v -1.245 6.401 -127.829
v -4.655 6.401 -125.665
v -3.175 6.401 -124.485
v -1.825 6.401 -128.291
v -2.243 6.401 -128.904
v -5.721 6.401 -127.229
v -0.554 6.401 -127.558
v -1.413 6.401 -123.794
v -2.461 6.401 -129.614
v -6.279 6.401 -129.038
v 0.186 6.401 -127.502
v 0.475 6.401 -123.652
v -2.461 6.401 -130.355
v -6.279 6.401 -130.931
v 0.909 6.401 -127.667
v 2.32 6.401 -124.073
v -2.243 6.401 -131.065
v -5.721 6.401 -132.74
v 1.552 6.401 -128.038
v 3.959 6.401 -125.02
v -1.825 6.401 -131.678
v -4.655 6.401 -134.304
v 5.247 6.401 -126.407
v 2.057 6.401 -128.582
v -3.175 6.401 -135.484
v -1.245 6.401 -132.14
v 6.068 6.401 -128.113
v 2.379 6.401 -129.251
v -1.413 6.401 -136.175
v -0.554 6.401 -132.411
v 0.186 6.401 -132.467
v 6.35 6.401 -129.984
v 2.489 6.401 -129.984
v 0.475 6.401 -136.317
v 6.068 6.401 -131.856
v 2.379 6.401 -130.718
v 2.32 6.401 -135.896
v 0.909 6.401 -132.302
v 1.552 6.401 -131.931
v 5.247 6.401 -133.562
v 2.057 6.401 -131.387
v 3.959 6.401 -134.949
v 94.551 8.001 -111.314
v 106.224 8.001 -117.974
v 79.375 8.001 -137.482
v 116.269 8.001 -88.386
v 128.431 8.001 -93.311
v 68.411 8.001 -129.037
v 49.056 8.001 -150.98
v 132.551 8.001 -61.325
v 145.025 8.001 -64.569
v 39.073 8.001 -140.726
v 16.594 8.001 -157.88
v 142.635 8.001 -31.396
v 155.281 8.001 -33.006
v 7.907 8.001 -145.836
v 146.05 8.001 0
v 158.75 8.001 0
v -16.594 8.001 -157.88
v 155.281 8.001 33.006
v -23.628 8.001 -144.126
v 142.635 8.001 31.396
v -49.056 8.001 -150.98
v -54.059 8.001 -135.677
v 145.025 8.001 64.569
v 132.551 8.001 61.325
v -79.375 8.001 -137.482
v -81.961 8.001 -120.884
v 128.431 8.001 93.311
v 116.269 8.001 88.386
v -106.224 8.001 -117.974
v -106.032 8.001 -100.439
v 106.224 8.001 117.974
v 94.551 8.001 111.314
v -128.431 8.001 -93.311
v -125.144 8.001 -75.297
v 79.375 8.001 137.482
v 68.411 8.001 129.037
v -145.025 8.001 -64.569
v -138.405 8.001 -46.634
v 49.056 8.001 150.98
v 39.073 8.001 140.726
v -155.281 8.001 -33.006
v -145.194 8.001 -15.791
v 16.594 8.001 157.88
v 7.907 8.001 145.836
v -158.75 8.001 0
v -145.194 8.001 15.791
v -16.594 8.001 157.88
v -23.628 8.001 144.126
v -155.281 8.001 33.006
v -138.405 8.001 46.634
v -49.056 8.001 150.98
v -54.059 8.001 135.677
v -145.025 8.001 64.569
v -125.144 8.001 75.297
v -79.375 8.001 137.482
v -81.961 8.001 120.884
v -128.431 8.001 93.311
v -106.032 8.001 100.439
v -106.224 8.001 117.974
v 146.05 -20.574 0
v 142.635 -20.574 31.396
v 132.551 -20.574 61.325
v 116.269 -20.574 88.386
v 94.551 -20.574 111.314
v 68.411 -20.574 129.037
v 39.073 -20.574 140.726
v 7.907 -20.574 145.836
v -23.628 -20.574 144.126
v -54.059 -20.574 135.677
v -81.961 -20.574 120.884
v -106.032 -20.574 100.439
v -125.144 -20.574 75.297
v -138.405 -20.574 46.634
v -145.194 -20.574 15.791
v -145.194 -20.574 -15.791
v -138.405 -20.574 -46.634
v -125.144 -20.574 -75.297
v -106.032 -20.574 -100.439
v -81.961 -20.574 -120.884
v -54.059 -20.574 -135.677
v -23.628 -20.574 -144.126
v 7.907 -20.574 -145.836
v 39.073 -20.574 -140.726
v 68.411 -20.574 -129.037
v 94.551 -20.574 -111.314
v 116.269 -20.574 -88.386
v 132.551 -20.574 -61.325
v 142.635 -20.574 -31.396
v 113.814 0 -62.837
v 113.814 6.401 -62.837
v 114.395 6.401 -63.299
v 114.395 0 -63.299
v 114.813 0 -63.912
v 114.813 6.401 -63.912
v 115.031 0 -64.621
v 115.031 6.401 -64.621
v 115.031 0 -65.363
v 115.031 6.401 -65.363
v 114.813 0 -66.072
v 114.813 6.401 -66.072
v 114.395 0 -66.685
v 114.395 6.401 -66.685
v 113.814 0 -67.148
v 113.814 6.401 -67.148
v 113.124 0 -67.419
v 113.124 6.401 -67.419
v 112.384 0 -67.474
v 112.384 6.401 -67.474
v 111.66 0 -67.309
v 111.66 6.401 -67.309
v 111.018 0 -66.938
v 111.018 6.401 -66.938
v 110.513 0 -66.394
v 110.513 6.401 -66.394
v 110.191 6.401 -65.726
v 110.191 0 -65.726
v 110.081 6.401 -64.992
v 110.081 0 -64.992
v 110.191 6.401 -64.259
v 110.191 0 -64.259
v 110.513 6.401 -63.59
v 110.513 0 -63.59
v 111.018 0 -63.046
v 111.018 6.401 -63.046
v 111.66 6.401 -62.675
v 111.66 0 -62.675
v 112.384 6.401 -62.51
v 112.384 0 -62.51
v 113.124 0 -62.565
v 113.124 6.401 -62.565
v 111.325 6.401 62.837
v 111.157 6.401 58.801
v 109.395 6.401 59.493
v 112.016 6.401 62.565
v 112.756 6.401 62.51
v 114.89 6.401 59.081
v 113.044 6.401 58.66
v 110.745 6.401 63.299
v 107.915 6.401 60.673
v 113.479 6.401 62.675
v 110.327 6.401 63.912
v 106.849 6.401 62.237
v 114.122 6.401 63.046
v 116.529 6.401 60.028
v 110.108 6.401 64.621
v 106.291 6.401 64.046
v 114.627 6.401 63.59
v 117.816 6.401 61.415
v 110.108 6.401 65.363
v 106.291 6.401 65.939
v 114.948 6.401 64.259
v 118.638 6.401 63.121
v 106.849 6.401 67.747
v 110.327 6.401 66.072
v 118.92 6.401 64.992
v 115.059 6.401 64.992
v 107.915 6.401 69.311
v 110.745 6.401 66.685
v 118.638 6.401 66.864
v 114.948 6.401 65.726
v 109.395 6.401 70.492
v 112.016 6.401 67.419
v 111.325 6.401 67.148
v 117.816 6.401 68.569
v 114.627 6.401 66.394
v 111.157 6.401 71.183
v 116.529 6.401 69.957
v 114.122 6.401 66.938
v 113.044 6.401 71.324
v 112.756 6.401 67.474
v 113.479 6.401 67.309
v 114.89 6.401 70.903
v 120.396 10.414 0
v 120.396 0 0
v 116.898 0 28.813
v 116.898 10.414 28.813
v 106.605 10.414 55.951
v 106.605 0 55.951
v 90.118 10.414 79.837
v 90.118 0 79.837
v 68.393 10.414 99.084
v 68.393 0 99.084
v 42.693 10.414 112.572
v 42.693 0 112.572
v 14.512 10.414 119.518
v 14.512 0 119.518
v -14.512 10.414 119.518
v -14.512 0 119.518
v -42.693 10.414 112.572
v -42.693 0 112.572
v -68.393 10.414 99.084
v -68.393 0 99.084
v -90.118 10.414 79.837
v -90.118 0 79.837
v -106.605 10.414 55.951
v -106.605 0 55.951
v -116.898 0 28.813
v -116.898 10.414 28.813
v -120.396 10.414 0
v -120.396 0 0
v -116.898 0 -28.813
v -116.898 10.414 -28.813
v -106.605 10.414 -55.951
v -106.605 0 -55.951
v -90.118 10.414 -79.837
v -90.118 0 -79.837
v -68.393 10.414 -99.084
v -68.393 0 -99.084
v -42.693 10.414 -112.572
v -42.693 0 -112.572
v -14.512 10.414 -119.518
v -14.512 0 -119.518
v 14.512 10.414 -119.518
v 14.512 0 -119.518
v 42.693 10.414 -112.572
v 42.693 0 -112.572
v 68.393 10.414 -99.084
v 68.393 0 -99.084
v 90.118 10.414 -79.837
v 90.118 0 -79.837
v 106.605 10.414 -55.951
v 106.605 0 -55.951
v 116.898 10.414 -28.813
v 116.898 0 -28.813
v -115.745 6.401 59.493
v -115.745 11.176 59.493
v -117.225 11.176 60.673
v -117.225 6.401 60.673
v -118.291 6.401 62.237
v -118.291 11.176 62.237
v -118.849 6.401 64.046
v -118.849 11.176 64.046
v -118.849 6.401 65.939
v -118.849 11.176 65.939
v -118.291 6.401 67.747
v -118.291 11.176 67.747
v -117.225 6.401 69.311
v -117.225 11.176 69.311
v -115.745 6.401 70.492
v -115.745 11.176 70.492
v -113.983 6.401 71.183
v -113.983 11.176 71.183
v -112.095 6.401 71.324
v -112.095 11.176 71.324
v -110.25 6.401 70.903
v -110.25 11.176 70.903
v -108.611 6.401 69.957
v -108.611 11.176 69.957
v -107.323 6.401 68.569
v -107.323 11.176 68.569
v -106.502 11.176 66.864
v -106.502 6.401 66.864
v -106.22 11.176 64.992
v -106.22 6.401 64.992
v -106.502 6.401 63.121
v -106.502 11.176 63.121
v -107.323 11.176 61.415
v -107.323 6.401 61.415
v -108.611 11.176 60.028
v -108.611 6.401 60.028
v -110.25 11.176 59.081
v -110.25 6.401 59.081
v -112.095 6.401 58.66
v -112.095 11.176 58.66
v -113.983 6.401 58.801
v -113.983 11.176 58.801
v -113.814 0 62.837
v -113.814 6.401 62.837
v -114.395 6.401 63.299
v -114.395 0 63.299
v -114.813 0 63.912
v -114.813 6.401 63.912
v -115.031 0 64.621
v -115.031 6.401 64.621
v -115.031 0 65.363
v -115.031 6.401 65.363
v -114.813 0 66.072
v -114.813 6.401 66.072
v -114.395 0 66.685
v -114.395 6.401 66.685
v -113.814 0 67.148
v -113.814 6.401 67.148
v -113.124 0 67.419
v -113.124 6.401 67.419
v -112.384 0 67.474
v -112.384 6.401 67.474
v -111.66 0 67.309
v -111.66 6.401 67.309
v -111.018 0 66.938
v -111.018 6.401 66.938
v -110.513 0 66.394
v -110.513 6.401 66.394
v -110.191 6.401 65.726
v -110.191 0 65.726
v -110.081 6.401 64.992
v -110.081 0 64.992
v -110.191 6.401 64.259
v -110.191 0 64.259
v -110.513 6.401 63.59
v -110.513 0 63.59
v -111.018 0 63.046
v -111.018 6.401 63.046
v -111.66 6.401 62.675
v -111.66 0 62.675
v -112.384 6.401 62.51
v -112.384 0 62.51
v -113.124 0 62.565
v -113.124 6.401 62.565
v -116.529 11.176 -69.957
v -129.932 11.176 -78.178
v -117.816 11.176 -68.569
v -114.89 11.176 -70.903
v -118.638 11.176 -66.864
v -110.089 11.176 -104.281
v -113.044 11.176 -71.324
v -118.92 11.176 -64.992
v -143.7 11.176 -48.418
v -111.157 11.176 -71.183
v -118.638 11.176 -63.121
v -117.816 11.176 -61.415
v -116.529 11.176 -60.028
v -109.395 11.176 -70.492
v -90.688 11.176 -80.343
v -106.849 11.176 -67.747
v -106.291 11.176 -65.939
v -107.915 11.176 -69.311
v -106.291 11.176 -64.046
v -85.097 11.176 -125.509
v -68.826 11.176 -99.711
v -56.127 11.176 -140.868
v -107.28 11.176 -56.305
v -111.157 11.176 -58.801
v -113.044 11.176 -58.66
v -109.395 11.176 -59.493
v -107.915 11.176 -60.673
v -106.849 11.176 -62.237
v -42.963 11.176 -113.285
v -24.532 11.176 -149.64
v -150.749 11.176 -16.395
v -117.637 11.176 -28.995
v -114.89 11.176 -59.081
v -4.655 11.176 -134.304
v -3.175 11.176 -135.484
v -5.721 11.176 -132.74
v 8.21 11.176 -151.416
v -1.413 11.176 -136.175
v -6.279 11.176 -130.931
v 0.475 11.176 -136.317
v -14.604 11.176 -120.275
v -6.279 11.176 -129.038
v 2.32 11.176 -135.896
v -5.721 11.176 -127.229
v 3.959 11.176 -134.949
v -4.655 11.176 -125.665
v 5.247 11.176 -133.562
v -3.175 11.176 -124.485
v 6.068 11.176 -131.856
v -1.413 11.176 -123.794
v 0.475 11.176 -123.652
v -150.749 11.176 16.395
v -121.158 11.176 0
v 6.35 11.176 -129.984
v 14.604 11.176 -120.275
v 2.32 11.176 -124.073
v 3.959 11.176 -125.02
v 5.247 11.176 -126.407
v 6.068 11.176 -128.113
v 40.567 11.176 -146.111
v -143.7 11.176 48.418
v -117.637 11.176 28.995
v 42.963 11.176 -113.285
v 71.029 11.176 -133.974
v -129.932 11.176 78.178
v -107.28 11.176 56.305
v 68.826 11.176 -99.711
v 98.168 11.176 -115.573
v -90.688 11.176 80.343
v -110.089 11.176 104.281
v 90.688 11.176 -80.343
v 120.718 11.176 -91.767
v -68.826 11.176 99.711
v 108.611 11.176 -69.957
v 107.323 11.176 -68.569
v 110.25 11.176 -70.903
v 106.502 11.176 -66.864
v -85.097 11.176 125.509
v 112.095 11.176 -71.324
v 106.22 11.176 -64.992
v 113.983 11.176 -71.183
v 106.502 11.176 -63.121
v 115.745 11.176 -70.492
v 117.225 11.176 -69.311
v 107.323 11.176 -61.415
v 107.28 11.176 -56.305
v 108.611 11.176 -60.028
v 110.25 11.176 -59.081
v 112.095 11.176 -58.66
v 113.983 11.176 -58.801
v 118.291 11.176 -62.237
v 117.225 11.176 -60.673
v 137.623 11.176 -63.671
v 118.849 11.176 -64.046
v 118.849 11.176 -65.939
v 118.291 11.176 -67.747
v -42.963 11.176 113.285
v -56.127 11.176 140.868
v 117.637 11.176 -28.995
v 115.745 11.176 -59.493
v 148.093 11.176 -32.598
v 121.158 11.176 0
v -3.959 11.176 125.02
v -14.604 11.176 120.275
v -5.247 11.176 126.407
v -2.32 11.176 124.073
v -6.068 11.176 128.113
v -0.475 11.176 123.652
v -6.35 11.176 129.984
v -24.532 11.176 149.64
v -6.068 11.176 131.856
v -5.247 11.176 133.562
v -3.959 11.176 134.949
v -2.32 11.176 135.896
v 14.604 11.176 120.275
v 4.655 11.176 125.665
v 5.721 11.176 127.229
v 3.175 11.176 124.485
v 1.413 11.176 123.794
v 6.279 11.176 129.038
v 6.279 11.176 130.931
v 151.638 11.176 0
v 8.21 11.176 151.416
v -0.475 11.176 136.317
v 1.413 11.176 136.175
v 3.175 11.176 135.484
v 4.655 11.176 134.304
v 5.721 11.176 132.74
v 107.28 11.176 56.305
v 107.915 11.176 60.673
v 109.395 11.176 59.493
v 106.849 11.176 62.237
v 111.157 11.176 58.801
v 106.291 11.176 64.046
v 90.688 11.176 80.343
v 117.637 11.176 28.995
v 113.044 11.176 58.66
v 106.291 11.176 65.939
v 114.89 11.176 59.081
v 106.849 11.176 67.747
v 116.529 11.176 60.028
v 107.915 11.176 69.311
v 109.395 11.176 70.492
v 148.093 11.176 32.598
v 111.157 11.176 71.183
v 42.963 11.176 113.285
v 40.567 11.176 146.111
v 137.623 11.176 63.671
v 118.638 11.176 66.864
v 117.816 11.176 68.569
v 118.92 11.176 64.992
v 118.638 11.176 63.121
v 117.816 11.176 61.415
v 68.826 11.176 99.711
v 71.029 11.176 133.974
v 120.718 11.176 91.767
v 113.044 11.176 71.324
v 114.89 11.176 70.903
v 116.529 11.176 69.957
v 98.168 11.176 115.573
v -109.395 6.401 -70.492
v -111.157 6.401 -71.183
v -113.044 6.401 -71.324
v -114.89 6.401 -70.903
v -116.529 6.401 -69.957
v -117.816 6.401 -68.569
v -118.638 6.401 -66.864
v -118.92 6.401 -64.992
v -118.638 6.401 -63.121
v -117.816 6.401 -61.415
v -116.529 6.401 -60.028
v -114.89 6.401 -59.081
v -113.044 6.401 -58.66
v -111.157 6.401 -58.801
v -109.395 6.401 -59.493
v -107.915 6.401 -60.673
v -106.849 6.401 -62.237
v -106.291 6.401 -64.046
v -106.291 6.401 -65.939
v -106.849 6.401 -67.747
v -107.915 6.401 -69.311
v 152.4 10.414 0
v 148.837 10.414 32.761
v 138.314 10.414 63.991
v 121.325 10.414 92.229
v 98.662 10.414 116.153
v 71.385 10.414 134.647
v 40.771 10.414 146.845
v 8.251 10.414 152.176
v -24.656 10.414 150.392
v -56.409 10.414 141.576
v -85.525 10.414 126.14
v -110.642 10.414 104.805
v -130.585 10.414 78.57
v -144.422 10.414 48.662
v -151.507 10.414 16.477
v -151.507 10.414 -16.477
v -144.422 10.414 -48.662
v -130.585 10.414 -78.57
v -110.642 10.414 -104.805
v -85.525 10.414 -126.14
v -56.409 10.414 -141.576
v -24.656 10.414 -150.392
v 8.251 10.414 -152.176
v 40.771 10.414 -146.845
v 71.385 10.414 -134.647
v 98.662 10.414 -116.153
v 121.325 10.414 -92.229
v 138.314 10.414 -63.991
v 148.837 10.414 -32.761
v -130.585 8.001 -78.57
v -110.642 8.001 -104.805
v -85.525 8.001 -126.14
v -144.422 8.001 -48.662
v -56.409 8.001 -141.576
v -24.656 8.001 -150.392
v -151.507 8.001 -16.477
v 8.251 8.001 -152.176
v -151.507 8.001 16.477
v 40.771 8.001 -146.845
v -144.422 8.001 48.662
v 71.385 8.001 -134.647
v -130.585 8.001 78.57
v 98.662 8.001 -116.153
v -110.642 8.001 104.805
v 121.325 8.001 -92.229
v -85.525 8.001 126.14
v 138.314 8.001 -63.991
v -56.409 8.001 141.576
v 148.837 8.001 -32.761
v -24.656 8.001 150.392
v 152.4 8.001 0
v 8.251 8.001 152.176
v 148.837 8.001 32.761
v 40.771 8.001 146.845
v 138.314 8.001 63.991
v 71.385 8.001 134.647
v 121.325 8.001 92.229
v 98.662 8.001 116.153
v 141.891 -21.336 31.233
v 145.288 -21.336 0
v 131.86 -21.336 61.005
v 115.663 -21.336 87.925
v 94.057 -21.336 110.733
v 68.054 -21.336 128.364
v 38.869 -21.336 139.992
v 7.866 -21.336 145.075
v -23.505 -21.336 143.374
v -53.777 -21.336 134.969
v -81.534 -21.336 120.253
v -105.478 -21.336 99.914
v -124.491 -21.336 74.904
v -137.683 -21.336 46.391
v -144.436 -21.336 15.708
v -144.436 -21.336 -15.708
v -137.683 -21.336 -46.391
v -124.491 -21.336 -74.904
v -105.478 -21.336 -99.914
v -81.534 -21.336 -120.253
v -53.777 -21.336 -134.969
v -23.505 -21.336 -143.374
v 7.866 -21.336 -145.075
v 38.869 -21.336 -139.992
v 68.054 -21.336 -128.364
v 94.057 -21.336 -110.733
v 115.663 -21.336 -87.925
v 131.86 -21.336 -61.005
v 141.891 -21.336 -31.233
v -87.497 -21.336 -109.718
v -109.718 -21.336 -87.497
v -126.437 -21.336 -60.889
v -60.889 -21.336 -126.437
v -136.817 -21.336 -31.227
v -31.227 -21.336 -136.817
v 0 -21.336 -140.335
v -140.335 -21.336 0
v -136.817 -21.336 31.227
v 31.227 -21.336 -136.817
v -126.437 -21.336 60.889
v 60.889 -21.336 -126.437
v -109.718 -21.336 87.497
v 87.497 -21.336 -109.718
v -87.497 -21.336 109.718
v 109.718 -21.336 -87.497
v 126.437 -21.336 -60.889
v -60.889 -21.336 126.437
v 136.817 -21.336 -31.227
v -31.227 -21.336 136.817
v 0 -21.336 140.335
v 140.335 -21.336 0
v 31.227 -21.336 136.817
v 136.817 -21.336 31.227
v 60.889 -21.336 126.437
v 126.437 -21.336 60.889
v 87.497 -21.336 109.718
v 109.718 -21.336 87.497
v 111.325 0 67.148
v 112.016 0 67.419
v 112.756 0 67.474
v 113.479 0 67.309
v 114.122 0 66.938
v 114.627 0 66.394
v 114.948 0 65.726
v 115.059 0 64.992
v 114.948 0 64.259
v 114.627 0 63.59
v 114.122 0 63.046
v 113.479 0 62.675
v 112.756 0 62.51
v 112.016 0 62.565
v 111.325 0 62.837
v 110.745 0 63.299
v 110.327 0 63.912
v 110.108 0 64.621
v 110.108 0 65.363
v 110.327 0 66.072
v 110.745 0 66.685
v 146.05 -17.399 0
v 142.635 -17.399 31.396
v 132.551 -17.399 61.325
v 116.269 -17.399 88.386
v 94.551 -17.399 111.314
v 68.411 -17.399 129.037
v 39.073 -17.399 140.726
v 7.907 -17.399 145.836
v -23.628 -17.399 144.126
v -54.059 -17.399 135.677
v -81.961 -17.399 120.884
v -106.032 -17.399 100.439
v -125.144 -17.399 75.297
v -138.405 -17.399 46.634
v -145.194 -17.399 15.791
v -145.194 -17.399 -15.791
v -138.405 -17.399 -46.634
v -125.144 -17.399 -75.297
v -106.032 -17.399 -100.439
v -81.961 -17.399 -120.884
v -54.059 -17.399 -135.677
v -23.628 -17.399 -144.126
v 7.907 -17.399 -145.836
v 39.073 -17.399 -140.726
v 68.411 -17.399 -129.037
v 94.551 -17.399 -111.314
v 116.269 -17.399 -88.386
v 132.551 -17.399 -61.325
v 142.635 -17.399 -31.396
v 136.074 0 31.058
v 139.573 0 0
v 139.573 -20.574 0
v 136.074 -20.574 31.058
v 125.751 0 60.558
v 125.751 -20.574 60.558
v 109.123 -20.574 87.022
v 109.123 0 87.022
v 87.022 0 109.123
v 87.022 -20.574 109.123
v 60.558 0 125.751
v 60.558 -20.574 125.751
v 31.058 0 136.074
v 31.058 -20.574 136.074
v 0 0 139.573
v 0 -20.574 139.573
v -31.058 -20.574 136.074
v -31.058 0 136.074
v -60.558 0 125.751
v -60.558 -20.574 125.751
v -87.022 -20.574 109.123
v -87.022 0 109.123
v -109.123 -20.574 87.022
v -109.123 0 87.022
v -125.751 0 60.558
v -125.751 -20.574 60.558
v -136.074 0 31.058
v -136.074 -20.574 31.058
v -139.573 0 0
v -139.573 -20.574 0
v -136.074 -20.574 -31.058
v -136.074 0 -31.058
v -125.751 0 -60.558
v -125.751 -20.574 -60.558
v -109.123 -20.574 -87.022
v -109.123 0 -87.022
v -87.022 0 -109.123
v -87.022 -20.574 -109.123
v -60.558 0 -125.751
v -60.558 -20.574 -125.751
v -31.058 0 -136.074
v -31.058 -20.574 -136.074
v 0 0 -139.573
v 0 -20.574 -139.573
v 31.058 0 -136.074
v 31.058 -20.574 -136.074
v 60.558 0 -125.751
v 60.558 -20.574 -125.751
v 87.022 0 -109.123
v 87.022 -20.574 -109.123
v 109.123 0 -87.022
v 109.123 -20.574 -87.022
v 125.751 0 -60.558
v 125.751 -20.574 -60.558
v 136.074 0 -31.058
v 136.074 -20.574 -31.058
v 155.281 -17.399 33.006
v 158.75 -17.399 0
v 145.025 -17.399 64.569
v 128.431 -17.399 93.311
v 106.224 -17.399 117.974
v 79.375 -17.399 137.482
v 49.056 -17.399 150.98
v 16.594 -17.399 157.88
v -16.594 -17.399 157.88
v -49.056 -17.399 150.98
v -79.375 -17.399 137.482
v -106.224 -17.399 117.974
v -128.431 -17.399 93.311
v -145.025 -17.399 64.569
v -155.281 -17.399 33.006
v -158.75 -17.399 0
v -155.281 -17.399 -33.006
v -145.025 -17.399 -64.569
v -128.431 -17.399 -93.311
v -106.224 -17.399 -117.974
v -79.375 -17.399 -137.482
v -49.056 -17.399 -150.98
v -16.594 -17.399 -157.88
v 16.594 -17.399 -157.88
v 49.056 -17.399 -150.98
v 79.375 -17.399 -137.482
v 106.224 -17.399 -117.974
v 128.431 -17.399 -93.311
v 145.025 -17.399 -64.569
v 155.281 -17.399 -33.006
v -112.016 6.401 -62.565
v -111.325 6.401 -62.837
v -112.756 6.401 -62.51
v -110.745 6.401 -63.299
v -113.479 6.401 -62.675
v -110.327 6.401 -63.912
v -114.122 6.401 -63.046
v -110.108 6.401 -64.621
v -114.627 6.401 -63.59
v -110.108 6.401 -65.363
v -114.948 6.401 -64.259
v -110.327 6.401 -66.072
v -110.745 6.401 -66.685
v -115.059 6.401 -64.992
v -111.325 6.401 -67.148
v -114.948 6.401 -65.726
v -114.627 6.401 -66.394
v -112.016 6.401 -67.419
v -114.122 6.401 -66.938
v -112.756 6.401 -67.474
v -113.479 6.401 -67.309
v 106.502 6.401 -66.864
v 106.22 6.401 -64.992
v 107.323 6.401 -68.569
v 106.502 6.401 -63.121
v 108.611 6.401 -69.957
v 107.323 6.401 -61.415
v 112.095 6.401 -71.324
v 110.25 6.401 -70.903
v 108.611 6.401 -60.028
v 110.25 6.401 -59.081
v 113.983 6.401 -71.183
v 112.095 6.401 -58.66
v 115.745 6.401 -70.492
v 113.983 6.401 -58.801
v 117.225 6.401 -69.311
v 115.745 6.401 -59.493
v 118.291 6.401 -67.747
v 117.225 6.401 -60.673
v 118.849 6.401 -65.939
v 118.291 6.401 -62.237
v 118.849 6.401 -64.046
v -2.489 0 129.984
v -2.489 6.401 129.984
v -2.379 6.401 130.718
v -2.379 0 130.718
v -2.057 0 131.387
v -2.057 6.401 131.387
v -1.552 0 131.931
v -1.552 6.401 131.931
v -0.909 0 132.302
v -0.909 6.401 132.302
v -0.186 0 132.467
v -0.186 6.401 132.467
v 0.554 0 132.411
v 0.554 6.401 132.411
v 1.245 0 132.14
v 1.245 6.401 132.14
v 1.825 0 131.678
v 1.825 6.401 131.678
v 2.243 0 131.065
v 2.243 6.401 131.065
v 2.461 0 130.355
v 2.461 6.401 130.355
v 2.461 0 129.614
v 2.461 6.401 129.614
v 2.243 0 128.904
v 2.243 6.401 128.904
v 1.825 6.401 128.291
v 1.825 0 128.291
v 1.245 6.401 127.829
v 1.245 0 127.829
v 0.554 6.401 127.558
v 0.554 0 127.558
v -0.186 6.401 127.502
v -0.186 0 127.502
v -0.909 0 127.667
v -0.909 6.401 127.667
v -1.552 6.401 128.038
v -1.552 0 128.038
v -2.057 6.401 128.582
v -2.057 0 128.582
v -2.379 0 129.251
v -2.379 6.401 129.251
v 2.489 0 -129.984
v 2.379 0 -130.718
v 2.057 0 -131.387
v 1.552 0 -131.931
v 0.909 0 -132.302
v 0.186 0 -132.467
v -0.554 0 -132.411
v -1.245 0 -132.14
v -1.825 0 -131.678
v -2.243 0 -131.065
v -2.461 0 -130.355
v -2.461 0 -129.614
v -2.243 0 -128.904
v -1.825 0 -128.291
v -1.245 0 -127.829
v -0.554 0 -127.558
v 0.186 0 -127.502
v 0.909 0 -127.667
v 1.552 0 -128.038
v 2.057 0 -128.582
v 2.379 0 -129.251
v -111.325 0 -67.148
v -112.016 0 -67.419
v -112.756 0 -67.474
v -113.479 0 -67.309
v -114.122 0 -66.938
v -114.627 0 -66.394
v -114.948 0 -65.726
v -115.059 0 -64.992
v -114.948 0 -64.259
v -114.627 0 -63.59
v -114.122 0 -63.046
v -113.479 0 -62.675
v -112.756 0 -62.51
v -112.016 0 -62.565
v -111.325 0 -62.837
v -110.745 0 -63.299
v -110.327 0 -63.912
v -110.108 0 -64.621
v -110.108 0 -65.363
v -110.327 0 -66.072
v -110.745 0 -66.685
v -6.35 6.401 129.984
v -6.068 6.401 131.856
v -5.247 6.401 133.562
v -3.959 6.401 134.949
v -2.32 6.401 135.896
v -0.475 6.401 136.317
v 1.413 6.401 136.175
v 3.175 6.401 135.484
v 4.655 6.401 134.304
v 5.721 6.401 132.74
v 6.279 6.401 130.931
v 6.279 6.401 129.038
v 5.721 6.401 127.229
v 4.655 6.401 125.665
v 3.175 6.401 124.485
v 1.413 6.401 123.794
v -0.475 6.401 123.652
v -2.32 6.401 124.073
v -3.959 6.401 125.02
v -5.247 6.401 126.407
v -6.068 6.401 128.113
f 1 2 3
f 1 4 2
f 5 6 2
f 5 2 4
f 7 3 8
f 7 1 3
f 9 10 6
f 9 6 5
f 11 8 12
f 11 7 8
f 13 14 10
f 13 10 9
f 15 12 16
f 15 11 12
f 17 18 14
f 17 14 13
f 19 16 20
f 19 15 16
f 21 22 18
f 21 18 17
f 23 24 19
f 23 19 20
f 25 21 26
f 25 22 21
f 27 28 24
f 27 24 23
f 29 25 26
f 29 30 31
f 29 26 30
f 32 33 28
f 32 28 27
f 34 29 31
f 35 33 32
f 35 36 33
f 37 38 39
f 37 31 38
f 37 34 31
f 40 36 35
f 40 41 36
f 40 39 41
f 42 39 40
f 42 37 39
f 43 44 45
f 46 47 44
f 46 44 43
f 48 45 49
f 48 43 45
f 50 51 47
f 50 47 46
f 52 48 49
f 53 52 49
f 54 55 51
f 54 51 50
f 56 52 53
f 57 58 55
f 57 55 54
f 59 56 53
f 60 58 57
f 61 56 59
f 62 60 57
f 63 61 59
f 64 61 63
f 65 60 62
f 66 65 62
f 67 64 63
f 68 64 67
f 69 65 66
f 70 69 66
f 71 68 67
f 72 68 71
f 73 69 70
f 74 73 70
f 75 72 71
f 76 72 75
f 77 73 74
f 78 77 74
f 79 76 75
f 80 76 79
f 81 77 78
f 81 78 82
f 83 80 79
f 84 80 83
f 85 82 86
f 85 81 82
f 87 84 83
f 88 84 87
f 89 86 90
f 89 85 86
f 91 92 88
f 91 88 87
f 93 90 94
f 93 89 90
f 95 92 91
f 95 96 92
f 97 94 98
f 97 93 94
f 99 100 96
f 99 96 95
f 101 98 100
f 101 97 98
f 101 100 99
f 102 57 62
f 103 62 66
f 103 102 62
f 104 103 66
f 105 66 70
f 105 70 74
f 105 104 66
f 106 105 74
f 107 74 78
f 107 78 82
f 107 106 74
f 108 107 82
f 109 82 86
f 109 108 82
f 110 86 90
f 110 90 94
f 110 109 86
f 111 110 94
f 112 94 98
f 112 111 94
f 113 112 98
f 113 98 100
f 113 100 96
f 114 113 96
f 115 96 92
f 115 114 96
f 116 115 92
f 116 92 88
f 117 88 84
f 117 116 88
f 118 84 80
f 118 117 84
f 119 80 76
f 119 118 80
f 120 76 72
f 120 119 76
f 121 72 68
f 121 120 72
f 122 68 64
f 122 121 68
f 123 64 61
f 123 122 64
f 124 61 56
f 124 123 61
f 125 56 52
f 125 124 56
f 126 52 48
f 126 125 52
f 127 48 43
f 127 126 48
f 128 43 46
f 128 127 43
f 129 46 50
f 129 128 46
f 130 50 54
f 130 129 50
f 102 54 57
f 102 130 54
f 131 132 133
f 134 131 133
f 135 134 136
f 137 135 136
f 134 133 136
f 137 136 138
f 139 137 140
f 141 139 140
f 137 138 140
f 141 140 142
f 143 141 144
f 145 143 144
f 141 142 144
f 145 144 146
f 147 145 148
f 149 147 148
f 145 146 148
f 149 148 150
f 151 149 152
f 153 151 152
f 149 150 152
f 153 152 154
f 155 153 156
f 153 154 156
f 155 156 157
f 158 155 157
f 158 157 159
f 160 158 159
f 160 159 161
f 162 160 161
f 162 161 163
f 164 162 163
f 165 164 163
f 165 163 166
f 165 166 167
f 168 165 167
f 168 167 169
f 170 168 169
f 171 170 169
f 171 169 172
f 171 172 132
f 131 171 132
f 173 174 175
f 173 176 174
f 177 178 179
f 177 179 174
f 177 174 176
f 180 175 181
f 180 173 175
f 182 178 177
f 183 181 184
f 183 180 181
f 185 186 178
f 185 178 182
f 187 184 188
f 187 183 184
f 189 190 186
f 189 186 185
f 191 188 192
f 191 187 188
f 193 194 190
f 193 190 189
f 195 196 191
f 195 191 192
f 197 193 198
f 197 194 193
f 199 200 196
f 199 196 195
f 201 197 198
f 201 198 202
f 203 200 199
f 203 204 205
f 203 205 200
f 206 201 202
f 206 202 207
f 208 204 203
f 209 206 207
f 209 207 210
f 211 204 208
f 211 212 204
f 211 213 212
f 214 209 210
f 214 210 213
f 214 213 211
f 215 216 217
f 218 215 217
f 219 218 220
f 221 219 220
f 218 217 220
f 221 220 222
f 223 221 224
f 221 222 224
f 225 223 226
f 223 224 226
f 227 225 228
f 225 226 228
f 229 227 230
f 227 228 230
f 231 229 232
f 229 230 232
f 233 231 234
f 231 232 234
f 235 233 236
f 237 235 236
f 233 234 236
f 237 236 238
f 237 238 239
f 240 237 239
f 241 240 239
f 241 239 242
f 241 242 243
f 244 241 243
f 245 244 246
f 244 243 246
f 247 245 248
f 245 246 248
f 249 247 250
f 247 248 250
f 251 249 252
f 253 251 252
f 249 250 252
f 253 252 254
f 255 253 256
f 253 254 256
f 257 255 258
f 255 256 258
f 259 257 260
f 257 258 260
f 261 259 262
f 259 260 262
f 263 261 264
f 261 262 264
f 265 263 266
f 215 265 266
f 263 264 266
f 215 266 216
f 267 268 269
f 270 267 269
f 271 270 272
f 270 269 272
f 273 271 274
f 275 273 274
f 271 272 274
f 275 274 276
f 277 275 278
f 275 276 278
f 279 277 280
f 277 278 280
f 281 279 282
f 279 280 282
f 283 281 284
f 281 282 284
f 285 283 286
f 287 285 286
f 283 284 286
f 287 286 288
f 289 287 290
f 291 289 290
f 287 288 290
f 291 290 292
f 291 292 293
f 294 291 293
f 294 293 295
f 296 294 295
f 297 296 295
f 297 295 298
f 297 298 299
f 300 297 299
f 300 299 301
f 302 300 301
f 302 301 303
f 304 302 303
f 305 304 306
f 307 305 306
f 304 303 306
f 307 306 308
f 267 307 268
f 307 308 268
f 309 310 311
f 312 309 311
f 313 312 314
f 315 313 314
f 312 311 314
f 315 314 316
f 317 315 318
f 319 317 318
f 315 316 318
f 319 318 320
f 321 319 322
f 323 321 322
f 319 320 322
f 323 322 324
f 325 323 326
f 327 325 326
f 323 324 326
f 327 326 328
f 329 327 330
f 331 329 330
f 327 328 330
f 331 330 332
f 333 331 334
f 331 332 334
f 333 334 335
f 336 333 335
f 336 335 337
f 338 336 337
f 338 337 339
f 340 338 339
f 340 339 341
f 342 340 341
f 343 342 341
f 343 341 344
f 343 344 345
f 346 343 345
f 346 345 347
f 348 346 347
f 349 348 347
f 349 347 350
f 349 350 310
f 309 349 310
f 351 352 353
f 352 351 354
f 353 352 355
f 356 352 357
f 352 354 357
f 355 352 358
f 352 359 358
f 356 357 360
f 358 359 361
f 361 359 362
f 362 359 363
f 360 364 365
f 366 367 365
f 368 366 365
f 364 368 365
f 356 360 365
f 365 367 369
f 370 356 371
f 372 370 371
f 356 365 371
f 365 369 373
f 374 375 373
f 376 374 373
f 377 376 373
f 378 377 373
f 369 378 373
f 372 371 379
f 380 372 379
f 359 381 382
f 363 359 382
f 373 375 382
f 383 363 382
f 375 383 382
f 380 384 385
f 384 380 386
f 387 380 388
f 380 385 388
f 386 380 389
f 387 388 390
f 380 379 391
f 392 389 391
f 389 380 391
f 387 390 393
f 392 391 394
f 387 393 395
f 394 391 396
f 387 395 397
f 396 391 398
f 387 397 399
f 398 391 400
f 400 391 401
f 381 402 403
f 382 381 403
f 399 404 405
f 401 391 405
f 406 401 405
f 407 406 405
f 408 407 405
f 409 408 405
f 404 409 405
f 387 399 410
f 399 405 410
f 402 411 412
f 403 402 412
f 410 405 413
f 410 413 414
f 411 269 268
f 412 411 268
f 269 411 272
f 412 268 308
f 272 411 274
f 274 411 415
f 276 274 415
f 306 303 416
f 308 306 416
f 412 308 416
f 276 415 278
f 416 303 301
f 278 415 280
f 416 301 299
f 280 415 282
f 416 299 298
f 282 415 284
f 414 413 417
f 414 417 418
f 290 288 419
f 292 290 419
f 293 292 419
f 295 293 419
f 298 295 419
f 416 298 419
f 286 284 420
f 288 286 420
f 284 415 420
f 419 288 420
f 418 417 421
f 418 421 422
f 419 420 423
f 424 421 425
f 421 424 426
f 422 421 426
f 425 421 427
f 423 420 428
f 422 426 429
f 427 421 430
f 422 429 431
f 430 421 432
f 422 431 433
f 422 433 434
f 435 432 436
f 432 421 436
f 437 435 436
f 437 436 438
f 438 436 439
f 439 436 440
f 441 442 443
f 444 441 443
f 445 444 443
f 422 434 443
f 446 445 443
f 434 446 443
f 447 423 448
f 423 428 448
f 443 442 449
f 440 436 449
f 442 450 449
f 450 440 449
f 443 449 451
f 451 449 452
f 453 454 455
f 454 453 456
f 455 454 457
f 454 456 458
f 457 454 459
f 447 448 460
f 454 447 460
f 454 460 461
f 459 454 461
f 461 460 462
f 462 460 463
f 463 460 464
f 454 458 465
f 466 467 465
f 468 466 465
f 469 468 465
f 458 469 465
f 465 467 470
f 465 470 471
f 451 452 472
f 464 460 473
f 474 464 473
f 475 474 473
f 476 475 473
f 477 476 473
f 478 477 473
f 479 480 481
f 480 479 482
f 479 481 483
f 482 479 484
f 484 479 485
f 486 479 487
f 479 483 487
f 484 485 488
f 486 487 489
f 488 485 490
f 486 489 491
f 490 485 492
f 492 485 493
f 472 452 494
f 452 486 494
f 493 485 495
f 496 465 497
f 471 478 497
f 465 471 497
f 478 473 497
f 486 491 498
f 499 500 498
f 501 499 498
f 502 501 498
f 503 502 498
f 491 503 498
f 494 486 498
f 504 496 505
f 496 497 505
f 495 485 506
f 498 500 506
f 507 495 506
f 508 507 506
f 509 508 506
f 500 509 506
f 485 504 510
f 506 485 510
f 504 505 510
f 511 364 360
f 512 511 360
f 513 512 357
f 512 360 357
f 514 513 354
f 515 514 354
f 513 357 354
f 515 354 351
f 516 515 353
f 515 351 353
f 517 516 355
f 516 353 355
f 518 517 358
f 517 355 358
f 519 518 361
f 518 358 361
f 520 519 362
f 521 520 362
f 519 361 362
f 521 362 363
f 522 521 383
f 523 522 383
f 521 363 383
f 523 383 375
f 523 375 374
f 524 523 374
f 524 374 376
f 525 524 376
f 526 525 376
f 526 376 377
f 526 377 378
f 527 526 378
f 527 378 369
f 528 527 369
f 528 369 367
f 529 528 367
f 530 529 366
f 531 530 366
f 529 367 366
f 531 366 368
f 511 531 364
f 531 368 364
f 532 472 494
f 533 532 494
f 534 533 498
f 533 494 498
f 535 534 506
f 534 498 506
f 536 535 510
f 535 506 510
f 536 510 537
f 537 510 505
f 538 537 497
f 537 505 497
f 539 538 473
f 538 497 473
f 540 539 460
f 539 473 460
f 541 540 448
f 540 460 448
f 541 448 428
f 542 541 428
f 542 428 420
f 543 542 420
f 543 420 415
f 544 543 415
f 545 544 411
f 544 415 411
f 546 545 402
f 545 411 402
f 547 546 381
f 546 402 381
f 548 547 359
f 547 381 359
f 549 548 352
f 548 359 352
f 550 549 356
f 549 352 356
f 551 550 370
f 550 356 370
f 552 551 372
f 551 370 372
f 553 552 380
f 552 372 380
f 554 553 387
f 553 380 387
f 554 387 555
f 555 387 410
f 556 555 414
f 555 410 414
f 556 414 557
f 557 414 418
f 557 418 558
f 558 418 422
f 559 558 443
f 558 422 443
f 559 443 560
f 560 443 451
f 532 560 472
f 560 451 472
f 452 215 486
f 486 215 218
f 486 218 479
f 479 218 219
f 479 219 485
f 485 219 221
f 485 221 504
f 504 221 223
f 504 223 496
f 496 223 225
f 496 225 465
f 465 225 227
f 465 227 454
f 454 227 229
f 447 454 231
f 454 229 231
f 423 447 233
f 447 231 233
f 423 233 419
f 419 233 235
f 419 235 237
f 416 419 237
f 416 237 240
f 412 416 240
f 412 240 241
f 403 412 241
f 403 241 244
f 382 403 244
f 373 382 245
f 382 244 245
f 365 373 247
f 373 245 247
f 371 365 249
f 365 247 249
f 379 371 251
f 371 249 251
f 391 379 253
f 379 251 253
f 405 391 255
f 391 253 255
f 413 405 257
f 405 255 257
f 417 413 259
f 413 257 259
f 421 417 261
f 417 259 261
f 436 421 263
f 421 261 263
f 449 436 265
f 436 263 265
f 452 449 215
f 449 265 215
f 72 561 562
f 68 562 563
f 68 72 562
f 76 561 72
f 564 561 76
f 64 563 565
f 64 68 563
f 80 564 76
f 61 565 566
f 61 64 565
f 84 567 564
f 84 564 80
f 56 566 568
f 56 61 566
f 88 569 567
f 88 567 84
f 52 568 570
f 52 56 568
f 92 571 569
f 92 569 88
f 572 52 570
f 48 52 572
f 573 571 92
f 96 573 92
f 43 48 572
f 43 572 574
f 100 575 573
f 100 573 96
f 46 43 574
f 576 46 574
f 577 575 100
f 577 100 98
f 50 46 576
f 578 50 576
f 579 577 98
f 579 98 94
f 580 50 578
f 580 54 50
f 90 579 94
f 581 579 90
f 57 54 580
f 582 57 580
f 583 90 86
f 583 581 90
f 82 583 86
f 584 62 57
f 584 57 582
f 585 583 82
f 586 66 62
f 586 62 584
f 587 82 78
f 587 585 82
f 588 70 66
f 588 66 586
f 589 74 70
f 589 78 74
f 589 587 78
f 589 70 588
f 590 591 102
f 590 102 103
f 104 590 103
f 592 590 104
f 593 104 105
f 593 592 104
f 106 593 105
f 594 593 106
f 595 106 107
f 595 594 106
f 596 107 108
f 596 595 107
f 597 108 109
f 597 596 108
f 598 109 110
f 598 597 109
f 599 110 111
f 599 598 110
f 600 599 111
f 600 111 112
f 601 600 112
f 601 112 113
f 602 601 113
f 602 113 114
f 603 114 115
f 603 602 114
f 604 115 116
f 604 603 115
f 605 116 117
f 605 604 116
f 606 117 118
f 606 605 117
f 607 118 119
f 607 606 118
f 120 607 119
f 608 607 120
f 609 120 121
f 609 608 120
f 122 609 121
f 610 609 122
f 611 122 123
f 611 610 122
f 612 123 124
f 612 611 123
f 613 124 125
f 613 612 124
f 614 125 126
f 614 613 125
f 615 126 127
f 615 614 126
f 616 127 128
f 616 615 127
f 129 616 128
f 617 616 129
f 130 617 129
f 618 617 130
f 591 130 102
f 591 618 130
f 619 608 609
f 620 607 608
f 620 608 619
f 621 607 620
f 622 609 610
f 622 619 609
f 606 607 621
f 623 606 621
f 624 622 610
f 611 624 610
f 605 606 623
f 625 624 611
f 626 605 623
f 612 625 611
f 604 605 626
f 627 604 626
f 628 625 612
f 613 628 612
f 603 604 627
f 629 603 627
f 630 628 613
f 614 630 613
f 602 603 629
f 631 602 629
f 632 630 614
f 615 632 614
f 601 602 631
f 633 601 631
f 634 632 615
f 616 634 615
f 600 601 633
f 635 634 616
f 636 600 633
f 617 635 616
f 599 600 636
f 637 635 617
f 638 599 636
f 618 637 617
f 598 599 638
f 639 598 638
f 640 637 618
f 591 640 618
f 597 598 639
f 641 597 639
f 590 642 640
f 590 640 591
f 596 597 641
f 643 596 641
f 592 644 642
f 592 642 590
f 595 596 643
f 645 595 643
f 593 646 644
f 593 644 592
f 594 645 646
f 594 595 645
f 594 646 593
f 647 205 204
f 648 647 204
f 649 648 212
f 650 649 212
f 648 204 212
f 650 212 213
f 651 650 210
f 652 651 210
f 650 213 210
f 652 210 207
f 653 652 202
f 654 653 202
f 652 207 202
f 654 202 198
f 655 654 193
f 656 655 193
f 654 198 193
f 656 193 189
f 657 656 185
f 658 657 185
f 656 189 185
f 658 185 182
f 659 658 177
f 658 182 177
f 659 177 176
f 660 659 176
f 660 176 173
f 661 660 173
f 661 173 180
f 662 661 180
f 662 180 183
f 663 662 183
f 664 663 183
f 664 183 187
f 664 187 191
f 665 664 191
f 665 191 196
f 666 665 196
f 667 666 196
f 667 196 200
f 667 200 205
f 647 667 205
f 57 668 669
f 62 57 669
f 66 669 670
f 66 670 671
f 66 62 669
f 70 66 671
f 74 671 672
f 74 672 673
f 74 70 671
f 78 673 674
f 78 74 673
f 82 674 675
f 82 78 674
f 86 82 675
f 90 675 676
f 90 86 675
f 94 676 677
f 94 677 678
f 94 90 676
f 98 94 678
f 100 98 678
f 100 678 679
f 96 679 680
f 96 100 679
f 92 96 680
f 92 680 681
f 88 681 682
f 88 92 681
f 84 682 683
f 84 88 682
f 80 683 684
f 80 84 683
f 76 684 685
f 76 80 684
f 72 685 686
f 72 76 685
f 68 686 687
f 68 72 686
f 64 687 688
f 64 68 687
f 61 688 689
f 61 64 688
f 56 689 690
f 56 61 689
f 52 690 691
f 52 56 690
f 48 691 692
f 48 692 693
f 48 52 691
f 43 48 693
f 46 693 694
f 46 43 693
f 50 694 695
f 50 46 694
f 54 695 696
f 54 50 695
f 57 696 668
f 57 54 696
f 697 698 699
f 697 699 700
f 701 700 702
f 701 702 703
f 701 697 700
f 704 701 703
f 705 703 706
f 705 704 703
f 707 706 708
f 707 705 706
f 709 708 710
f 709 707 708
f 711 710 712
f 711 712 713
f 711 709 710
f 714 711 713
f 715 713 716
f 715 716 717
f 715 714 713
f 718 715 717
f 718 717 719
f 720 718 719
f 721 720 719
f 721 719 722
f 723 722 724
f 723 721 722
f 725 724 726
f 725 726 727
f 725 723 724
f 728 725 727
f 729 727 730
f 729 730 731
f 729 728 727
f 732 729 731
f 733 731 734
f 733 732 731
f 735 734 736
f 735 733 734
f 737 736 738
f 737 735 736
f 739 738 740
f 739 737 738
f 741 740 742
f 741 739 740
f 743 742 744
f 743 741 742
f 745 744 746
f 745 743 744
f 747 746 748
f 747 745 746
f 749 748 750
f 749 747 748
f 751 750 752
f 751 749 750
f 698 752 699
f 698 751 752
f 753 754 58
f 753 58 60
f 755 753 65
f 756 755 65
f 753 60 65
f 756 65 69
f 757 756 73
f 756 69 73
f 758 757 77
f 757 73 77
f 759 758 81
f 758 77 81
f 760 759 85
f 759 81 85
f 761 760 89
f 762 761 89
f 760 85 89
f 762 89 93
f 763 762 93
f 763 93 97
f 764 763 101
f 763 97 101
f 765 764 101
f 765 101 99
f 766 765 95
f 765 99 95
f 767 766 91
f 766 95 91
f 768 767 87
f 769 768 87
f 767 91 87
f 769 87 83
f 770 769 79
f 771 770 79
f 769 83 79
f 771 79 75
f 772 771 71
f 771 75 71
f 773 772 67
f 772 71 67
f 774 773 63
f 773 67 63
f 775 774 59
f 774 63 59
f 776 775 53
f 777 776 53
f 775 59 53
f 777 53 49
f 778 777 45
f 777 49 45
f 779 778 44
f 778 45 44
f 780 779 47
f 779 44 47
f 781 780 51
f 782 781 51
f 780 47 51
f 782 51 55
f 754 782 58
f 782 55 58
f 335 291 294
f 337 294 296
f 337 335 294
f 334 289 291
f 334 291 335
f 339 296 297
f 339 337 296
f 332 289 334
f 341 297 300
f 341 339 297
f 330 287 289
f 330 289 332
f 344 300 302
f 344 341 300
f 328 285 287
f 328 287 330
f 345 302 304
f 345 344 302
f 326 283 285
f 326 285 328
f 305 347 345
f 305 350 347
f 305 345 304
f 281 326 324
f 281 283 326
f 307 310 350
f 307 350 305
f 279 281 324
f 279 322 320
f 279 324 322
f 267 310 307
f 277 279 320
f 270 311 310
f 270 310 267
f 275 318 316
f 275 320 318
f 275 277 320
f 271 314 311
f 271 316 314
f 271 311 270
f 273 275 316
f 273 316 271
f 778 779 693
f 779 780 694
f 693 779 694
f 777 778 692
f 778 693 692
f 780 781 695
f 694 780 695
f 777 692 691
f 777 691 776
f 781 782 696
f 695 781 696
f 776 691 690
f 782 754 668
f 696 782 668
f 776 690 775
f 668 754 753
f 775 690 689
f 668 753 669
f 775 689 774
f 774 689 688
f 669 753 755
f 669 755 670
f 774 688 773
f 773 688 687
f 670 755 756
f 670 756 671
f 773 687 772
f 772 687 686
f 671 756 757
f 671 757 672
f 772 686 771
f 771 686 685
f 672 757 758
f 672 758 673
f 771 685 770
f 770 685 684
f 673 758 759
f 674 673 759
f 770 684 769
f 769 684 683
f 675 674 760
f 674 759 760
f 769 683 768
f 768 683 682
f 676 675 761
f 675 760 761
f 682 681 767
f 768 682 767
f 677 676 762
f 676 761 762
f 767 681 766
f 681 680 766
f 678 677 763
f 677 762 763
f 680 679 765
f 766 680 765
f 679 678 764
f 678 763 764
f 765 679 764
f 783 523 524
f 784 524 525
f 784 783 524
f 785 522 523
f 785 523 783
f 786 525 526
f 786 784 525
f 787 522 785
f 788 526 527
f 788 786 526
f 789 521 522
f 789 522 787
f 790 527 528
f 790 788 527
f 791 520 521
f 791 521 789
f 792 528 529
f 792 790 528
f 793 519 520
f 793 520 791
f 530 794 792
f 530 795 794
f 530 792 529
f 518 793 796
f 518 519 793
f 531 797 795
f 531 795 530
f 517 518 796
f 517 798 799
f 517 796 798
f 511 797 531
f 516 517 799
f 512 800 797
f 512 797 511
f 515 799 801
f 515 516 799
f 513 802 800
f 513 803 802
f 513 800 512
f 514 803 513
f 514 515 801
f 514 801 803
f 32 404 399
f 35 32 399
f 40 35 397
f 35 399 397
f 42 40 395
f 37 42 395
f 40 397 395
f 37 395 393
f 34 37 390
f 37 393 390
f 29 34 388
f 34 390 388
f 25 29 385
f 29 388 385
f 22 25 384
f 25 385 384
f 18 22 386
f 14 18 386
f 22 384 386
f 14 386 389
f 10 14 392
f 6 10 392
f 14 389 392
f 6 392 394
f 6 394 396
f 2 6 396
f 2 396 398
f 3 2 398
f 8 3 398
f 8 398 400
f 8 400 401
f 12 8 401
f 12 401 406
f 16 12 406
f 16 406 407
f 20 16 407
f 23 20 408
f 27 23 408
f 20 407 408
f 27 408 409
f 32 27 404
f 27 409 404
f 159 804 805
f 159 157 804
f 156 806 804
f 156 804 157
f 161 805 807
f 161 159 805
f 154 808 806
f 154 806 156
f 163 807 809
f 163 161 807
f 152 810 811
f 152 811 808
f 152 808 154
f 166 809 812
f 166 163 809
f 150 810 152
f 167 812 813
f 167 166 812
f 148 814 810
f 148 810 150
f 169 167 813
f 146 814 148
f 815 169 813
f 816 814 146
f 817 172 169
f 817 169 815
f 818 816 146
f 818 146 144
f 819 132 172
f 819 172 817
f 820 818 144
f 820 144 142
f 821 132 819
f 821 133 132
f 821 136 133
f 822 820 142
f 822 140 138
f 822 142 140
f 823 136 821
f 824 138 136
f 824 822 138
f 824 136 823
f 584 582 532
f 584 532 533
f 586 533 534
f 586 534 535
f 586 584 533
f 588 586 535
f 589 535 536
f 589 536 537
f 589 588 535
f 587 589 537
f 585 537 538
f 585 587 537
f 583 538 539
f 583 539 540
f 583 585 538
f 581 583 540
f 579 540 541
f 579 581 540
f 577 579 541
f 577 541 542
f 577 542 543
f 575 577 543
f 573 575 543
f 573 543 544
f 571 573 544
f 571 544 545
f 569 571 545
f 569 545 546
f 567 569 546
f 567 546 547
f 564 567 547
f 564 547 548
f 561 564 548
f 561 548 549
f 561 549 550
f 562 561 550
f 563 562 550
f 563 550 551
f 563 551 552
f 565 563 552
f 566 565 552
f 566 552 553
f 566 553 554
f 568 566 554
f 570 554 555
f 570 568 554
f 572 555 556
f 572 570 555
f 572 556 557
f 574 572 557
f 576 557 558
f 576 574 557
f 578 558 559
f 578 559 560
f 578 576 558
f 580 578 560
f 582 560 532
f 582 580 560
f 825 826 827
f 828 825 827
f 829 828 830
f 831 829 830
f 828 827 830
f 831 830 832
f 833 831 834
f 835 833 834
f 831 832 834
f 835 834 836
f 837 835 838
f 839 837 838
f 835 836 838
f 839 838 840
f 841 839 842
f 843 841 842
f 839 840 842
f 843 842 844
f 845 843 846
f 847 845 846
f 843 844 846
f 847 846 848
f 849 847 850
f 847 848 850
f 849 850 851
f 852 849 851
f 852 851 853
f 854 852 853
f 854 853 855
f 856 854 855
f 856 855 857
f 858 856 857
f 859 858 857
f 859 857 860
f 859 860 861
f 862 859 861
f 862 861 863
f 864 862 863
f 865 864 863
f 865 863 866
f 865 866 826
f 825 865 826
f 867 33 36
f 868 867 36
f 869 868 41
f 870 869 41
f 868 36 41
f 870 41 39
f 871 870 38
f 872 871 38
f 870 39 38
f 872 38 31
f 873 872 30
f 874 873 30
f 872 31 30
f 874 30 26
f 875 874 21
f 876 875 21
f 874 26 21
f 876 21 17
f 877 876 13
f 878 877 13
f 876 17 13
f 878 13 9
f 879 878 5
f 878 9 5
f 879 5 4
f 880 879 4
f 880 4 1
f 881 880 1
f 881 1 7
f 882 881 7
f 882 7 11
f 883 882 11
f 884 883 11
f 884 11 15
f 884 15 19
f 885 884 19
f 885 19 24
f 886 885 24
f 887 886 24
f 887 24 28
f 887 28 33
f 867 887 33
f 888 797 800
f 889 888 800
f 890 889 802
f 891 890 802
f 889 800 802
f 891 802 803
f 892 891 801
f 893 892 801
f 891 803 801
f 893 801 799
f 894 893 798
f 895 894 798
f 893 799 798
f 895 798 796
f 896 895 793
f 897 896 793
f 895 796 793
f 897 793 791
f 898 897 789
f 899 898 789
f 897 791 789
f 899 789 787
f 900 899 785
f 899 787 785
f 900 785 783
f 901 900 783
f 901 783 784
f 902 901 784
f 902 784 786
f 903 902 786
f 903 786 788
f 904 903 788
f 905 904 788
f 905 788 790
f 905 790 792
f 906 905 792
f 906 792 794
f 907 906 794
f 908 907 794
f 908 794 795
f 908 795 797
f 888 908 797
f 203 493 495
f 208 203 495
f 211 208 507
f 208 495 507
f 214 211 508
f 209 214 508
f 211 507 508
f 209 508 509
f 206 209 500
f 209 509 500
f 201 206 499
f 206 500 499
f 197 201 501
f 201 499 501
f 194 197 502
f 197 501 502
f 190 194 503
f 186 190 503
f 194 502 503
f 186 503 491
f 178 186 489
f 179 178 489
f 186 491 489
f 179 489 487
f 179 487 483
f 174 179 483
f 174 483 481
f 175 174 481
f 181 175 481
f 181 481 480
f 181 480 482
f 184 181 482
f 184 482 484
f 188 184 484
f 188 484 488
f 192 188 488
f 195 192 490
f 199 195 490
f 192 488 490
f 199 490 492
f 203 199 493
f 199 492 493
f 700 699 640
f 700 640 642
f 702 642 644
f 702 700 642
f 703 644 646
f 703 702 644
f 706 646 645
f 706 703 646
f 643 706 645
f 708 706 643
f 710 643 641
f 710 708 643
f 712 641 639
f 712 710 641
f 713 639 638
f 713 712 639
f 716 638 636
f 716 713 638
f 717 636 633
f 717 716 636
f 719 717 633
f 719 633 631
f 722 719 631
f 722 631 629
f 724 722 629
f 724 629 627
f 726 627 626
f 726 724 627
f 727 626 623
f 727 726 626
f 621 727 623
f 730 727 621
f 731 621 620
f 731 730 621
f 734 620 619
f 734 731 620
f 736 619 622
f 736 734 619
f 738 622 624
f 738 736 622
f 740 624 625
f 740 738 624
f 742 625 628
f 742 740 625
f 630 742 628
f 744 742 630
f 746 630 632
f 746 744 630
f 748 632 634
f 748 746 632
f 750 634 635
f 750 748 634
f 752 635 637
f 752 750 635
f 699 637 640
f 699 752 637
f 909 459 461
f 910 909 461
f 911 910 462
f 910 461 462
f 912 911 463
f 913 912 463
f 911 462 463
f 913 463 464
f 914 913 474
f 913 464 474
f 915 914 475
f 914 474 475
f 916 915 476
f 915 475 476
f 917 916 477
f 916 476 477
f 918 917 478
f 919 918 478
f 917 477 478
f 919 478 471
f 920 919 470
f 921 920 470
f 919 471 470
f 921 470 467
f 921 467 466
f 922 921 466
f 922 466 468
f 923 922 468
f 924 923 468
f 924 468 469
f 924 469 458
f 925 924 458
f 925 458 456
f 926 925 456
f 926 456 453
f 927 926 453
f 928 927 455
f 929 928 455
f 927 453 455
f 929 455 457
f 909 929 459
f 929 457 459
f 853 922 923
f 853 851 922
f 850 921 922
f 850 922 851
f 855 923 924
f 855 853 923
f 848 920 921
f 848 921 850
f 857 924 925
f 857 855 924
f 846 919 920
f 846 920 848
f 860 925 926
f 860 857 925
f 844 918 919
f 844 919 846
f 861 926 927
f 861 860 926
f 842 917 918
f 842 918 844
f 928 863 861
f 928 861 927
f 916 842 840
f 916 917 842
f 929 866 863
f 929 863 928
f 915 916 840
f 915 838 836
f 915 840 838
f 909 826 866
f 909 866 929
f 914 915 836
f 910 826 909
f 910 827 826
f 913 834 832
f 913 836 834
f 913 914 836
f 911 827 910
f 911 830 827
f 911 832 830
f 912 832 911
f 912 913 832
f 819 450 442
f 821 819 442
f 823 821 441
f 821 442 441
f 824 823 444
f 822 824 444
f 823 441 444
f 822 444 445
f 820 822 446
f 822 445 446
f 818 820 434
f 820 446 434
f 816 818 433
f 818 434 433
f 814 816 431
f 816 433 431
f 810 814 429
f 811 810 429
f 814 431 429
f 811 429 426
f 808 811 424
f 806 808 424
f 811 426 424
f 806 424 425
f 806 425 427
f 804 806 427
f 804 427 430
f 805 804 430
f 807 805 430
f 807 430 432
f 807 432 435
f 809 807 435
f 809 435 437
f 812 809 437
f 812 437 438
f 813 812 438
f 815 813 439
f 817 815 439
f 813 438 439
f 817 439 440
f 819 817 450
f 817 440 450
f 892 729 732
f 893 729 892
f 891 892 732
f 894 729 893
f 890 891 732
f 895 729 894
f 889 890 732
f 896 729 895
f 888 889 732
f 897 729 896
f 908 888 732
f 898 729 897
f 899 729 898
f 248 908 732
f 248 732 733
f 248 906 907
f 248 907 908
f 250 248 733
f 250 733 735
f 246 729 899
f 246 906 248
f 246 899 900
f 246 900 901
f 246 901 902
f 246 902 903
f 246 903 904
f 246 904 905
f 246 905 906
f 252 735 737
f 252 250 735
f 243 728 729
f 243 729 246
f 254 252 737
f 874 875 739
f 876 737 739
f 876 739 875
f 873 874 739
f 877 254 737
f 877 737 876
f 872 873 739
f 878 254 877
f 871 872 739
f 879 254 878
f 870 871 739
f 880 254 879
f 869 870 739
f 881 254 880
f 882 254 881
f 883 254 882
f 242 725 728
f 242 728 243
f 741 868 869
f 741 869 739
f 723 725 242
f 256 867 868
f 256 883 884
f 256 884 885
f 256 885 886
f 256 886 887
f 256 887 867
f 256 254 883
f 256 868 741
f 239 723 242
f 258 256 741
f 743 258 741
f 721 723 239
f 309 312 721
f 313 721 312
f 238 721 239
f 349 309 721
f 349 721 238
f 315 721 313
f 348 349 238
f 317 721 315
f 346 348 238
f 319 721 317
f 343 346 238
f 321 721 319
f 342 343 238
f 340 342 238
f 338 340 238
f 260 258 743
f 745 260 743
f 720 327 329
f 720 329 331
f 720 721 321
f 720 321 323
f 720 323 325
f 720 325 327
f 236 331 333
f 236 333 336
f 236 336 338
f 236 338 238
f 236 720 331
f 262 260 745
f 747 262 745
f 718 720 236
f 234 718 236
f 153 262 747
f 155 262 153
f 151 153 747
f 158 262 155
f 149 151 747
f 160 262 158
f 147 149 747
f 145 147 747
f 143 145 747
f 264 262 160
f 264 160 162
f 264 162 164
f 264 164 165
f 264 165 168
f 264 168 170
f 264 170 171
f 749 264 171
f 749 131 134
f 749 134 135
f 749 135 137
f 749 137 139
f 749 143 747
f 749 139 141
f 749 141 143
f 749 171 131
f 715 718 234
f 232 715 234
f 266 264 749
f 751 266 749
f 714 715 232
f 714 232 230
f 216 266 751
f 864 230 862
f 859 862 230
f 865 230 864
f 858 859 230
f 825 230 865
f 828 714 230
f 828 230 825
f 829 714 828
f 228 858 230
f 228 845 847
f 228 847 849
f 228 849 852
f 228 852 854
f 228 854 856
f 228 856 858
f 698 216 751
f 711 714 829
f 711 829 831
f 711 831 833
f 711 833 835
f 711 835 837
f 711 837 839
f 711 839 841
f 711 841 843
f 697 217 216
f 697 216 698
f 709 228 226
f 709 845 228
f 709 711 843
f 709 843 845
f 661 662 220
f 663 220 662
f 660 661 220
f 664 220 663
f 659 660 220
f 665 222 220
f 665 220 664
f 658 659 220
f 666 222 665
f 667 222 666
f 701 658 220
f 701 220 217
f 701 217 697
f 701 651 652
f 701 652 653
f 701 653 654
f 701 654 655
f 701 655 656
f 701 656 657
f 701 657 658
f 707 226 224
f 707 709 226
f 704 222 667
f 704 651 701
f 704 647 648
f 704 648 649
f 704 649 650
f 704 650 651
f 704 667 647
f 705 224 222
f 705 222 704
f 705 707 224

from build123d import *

# Parameters (mm, degrees)
F0_R             = 152.4
F0_R_2           = 120.396
F1_DEPTH         = 11.176
F2_R             = 152.4
F2_R_2           = 139.573
F3_DEPTH         = 21.336
F6_SIZE          = 0.762
F7_W             = 12.7
F7_H             = 25.4
F9_R             = 6.35
F10_DEPTH        = 4.7752
F10_COPIES_COUNT = 6
F11_R            = 2.4892
F12_DEPTH        = 25.4
F12_COPIES_COUNT = 6


# Not quite as in the source:
# - a pattern or mirror of a feature is missing from the dataset's text; its kind, count and spacing are read off the source's solid


with BuildPart() as f1:
    # F0 (on Front) → F1 (new body)
    with BuildSketch(Plane.XZ):
        Circle(F0_R)
        Circle(F0_R_2, mode=Mode.SUBTRACT)
    extrude(amount=-F1_DEPTH)

    # F2 (on face) → F3 (join)
    with BuildSketch(Plane.XZ):
        Circle(F2_R)
        Circle(F2_R_2, mode=Mode.SUBTRACT)
    extrude(amount=F3_DEPTH)

    # F4 (on Top) → F5 (revolve, cut)
    with BuildSketch(Plane.XY):
        Polygon((176.0028898716, -18.161), (176.0028898716, 8.001), (146.05, 8.001), (146.05, -18.161), (146.05, -21.336), (152.4, -21.336), (176.0028898716, -21.336), align=None)
    revolve(axis=Axis((0, -10.1678725332, 0), (0, -1, 0)), mode=Mode.SUBTRACT)

    # F6
    f6_edges = [f1.edges().sort_by_distance(p)[0] for p in [
        (-120.396, 11.176, 0),
        (-152.4, 11.176, 0),
        (-139.573, -21.336, 0),
        (-146.05, -21.336, 0),
        (146.05, -6.6675, 0),
    ]]
    chamfer(f6_edges, length=F6_SIZE)

    # F9 (on face) → F10 (cut)
    with BuildSketch(Plane(origin=(0, 11.176, 0), x_dir=(-1, 0, 0), z_dir=(0, 1, 0))):
        with Locations((0, 129.9845)):
            Circle(F9_R)
    f10 = extrude(amount=-F10_DEPTH, mode=Mode.SUBTRACT)

    # F10_copies: F10 ×6 about axis
    f10_copies_axis = Axis((0, 0, 0), (0, 1, 0))
    for i in range(1, F10_COPIES_COUNT):
        add(f10.rotate(f10_copies_axis, i * 360 / F10_COPIES_COUNT), mode=Mode.SUBTRACT)

    # F11 (on face) → F12 (cut)
    with BuildSketch(Plane(origin=(0, 11.176, 0), x_dir=(-1, 0, 0), z_dir=(0, 1, 0))):
        with Locations((0, 129.9845)):
            Circle(F11_R)
    f12 = extrude(amount=-F12_DEPTH, mode=Mode.SUBTRACT)

    # F12_copies: F12 ×6 about axis
    f12_copies_axis = Axis((0, 0, 0), (0, 1, 0))
    for i in range(1, F12_COPIES_COUNT):
        add(f12.rotate(f12_copies_axis, i * 360 / F12_COPIES_COUNT), mode=Mode.SUBTRACT)


with BuildPart() as f8:
    # F7 (on Top) → F8 (revolve)
    with BuildSketch(Plane.XY):
        with Locations((152.4, -4.699)):
            Rectangle(F7_W, F7_H)
    revolve(axis=Axis((0, -13.9294480905, 0), (0, -1, 0)))


solid = Compound([f1.part, f8.part])
